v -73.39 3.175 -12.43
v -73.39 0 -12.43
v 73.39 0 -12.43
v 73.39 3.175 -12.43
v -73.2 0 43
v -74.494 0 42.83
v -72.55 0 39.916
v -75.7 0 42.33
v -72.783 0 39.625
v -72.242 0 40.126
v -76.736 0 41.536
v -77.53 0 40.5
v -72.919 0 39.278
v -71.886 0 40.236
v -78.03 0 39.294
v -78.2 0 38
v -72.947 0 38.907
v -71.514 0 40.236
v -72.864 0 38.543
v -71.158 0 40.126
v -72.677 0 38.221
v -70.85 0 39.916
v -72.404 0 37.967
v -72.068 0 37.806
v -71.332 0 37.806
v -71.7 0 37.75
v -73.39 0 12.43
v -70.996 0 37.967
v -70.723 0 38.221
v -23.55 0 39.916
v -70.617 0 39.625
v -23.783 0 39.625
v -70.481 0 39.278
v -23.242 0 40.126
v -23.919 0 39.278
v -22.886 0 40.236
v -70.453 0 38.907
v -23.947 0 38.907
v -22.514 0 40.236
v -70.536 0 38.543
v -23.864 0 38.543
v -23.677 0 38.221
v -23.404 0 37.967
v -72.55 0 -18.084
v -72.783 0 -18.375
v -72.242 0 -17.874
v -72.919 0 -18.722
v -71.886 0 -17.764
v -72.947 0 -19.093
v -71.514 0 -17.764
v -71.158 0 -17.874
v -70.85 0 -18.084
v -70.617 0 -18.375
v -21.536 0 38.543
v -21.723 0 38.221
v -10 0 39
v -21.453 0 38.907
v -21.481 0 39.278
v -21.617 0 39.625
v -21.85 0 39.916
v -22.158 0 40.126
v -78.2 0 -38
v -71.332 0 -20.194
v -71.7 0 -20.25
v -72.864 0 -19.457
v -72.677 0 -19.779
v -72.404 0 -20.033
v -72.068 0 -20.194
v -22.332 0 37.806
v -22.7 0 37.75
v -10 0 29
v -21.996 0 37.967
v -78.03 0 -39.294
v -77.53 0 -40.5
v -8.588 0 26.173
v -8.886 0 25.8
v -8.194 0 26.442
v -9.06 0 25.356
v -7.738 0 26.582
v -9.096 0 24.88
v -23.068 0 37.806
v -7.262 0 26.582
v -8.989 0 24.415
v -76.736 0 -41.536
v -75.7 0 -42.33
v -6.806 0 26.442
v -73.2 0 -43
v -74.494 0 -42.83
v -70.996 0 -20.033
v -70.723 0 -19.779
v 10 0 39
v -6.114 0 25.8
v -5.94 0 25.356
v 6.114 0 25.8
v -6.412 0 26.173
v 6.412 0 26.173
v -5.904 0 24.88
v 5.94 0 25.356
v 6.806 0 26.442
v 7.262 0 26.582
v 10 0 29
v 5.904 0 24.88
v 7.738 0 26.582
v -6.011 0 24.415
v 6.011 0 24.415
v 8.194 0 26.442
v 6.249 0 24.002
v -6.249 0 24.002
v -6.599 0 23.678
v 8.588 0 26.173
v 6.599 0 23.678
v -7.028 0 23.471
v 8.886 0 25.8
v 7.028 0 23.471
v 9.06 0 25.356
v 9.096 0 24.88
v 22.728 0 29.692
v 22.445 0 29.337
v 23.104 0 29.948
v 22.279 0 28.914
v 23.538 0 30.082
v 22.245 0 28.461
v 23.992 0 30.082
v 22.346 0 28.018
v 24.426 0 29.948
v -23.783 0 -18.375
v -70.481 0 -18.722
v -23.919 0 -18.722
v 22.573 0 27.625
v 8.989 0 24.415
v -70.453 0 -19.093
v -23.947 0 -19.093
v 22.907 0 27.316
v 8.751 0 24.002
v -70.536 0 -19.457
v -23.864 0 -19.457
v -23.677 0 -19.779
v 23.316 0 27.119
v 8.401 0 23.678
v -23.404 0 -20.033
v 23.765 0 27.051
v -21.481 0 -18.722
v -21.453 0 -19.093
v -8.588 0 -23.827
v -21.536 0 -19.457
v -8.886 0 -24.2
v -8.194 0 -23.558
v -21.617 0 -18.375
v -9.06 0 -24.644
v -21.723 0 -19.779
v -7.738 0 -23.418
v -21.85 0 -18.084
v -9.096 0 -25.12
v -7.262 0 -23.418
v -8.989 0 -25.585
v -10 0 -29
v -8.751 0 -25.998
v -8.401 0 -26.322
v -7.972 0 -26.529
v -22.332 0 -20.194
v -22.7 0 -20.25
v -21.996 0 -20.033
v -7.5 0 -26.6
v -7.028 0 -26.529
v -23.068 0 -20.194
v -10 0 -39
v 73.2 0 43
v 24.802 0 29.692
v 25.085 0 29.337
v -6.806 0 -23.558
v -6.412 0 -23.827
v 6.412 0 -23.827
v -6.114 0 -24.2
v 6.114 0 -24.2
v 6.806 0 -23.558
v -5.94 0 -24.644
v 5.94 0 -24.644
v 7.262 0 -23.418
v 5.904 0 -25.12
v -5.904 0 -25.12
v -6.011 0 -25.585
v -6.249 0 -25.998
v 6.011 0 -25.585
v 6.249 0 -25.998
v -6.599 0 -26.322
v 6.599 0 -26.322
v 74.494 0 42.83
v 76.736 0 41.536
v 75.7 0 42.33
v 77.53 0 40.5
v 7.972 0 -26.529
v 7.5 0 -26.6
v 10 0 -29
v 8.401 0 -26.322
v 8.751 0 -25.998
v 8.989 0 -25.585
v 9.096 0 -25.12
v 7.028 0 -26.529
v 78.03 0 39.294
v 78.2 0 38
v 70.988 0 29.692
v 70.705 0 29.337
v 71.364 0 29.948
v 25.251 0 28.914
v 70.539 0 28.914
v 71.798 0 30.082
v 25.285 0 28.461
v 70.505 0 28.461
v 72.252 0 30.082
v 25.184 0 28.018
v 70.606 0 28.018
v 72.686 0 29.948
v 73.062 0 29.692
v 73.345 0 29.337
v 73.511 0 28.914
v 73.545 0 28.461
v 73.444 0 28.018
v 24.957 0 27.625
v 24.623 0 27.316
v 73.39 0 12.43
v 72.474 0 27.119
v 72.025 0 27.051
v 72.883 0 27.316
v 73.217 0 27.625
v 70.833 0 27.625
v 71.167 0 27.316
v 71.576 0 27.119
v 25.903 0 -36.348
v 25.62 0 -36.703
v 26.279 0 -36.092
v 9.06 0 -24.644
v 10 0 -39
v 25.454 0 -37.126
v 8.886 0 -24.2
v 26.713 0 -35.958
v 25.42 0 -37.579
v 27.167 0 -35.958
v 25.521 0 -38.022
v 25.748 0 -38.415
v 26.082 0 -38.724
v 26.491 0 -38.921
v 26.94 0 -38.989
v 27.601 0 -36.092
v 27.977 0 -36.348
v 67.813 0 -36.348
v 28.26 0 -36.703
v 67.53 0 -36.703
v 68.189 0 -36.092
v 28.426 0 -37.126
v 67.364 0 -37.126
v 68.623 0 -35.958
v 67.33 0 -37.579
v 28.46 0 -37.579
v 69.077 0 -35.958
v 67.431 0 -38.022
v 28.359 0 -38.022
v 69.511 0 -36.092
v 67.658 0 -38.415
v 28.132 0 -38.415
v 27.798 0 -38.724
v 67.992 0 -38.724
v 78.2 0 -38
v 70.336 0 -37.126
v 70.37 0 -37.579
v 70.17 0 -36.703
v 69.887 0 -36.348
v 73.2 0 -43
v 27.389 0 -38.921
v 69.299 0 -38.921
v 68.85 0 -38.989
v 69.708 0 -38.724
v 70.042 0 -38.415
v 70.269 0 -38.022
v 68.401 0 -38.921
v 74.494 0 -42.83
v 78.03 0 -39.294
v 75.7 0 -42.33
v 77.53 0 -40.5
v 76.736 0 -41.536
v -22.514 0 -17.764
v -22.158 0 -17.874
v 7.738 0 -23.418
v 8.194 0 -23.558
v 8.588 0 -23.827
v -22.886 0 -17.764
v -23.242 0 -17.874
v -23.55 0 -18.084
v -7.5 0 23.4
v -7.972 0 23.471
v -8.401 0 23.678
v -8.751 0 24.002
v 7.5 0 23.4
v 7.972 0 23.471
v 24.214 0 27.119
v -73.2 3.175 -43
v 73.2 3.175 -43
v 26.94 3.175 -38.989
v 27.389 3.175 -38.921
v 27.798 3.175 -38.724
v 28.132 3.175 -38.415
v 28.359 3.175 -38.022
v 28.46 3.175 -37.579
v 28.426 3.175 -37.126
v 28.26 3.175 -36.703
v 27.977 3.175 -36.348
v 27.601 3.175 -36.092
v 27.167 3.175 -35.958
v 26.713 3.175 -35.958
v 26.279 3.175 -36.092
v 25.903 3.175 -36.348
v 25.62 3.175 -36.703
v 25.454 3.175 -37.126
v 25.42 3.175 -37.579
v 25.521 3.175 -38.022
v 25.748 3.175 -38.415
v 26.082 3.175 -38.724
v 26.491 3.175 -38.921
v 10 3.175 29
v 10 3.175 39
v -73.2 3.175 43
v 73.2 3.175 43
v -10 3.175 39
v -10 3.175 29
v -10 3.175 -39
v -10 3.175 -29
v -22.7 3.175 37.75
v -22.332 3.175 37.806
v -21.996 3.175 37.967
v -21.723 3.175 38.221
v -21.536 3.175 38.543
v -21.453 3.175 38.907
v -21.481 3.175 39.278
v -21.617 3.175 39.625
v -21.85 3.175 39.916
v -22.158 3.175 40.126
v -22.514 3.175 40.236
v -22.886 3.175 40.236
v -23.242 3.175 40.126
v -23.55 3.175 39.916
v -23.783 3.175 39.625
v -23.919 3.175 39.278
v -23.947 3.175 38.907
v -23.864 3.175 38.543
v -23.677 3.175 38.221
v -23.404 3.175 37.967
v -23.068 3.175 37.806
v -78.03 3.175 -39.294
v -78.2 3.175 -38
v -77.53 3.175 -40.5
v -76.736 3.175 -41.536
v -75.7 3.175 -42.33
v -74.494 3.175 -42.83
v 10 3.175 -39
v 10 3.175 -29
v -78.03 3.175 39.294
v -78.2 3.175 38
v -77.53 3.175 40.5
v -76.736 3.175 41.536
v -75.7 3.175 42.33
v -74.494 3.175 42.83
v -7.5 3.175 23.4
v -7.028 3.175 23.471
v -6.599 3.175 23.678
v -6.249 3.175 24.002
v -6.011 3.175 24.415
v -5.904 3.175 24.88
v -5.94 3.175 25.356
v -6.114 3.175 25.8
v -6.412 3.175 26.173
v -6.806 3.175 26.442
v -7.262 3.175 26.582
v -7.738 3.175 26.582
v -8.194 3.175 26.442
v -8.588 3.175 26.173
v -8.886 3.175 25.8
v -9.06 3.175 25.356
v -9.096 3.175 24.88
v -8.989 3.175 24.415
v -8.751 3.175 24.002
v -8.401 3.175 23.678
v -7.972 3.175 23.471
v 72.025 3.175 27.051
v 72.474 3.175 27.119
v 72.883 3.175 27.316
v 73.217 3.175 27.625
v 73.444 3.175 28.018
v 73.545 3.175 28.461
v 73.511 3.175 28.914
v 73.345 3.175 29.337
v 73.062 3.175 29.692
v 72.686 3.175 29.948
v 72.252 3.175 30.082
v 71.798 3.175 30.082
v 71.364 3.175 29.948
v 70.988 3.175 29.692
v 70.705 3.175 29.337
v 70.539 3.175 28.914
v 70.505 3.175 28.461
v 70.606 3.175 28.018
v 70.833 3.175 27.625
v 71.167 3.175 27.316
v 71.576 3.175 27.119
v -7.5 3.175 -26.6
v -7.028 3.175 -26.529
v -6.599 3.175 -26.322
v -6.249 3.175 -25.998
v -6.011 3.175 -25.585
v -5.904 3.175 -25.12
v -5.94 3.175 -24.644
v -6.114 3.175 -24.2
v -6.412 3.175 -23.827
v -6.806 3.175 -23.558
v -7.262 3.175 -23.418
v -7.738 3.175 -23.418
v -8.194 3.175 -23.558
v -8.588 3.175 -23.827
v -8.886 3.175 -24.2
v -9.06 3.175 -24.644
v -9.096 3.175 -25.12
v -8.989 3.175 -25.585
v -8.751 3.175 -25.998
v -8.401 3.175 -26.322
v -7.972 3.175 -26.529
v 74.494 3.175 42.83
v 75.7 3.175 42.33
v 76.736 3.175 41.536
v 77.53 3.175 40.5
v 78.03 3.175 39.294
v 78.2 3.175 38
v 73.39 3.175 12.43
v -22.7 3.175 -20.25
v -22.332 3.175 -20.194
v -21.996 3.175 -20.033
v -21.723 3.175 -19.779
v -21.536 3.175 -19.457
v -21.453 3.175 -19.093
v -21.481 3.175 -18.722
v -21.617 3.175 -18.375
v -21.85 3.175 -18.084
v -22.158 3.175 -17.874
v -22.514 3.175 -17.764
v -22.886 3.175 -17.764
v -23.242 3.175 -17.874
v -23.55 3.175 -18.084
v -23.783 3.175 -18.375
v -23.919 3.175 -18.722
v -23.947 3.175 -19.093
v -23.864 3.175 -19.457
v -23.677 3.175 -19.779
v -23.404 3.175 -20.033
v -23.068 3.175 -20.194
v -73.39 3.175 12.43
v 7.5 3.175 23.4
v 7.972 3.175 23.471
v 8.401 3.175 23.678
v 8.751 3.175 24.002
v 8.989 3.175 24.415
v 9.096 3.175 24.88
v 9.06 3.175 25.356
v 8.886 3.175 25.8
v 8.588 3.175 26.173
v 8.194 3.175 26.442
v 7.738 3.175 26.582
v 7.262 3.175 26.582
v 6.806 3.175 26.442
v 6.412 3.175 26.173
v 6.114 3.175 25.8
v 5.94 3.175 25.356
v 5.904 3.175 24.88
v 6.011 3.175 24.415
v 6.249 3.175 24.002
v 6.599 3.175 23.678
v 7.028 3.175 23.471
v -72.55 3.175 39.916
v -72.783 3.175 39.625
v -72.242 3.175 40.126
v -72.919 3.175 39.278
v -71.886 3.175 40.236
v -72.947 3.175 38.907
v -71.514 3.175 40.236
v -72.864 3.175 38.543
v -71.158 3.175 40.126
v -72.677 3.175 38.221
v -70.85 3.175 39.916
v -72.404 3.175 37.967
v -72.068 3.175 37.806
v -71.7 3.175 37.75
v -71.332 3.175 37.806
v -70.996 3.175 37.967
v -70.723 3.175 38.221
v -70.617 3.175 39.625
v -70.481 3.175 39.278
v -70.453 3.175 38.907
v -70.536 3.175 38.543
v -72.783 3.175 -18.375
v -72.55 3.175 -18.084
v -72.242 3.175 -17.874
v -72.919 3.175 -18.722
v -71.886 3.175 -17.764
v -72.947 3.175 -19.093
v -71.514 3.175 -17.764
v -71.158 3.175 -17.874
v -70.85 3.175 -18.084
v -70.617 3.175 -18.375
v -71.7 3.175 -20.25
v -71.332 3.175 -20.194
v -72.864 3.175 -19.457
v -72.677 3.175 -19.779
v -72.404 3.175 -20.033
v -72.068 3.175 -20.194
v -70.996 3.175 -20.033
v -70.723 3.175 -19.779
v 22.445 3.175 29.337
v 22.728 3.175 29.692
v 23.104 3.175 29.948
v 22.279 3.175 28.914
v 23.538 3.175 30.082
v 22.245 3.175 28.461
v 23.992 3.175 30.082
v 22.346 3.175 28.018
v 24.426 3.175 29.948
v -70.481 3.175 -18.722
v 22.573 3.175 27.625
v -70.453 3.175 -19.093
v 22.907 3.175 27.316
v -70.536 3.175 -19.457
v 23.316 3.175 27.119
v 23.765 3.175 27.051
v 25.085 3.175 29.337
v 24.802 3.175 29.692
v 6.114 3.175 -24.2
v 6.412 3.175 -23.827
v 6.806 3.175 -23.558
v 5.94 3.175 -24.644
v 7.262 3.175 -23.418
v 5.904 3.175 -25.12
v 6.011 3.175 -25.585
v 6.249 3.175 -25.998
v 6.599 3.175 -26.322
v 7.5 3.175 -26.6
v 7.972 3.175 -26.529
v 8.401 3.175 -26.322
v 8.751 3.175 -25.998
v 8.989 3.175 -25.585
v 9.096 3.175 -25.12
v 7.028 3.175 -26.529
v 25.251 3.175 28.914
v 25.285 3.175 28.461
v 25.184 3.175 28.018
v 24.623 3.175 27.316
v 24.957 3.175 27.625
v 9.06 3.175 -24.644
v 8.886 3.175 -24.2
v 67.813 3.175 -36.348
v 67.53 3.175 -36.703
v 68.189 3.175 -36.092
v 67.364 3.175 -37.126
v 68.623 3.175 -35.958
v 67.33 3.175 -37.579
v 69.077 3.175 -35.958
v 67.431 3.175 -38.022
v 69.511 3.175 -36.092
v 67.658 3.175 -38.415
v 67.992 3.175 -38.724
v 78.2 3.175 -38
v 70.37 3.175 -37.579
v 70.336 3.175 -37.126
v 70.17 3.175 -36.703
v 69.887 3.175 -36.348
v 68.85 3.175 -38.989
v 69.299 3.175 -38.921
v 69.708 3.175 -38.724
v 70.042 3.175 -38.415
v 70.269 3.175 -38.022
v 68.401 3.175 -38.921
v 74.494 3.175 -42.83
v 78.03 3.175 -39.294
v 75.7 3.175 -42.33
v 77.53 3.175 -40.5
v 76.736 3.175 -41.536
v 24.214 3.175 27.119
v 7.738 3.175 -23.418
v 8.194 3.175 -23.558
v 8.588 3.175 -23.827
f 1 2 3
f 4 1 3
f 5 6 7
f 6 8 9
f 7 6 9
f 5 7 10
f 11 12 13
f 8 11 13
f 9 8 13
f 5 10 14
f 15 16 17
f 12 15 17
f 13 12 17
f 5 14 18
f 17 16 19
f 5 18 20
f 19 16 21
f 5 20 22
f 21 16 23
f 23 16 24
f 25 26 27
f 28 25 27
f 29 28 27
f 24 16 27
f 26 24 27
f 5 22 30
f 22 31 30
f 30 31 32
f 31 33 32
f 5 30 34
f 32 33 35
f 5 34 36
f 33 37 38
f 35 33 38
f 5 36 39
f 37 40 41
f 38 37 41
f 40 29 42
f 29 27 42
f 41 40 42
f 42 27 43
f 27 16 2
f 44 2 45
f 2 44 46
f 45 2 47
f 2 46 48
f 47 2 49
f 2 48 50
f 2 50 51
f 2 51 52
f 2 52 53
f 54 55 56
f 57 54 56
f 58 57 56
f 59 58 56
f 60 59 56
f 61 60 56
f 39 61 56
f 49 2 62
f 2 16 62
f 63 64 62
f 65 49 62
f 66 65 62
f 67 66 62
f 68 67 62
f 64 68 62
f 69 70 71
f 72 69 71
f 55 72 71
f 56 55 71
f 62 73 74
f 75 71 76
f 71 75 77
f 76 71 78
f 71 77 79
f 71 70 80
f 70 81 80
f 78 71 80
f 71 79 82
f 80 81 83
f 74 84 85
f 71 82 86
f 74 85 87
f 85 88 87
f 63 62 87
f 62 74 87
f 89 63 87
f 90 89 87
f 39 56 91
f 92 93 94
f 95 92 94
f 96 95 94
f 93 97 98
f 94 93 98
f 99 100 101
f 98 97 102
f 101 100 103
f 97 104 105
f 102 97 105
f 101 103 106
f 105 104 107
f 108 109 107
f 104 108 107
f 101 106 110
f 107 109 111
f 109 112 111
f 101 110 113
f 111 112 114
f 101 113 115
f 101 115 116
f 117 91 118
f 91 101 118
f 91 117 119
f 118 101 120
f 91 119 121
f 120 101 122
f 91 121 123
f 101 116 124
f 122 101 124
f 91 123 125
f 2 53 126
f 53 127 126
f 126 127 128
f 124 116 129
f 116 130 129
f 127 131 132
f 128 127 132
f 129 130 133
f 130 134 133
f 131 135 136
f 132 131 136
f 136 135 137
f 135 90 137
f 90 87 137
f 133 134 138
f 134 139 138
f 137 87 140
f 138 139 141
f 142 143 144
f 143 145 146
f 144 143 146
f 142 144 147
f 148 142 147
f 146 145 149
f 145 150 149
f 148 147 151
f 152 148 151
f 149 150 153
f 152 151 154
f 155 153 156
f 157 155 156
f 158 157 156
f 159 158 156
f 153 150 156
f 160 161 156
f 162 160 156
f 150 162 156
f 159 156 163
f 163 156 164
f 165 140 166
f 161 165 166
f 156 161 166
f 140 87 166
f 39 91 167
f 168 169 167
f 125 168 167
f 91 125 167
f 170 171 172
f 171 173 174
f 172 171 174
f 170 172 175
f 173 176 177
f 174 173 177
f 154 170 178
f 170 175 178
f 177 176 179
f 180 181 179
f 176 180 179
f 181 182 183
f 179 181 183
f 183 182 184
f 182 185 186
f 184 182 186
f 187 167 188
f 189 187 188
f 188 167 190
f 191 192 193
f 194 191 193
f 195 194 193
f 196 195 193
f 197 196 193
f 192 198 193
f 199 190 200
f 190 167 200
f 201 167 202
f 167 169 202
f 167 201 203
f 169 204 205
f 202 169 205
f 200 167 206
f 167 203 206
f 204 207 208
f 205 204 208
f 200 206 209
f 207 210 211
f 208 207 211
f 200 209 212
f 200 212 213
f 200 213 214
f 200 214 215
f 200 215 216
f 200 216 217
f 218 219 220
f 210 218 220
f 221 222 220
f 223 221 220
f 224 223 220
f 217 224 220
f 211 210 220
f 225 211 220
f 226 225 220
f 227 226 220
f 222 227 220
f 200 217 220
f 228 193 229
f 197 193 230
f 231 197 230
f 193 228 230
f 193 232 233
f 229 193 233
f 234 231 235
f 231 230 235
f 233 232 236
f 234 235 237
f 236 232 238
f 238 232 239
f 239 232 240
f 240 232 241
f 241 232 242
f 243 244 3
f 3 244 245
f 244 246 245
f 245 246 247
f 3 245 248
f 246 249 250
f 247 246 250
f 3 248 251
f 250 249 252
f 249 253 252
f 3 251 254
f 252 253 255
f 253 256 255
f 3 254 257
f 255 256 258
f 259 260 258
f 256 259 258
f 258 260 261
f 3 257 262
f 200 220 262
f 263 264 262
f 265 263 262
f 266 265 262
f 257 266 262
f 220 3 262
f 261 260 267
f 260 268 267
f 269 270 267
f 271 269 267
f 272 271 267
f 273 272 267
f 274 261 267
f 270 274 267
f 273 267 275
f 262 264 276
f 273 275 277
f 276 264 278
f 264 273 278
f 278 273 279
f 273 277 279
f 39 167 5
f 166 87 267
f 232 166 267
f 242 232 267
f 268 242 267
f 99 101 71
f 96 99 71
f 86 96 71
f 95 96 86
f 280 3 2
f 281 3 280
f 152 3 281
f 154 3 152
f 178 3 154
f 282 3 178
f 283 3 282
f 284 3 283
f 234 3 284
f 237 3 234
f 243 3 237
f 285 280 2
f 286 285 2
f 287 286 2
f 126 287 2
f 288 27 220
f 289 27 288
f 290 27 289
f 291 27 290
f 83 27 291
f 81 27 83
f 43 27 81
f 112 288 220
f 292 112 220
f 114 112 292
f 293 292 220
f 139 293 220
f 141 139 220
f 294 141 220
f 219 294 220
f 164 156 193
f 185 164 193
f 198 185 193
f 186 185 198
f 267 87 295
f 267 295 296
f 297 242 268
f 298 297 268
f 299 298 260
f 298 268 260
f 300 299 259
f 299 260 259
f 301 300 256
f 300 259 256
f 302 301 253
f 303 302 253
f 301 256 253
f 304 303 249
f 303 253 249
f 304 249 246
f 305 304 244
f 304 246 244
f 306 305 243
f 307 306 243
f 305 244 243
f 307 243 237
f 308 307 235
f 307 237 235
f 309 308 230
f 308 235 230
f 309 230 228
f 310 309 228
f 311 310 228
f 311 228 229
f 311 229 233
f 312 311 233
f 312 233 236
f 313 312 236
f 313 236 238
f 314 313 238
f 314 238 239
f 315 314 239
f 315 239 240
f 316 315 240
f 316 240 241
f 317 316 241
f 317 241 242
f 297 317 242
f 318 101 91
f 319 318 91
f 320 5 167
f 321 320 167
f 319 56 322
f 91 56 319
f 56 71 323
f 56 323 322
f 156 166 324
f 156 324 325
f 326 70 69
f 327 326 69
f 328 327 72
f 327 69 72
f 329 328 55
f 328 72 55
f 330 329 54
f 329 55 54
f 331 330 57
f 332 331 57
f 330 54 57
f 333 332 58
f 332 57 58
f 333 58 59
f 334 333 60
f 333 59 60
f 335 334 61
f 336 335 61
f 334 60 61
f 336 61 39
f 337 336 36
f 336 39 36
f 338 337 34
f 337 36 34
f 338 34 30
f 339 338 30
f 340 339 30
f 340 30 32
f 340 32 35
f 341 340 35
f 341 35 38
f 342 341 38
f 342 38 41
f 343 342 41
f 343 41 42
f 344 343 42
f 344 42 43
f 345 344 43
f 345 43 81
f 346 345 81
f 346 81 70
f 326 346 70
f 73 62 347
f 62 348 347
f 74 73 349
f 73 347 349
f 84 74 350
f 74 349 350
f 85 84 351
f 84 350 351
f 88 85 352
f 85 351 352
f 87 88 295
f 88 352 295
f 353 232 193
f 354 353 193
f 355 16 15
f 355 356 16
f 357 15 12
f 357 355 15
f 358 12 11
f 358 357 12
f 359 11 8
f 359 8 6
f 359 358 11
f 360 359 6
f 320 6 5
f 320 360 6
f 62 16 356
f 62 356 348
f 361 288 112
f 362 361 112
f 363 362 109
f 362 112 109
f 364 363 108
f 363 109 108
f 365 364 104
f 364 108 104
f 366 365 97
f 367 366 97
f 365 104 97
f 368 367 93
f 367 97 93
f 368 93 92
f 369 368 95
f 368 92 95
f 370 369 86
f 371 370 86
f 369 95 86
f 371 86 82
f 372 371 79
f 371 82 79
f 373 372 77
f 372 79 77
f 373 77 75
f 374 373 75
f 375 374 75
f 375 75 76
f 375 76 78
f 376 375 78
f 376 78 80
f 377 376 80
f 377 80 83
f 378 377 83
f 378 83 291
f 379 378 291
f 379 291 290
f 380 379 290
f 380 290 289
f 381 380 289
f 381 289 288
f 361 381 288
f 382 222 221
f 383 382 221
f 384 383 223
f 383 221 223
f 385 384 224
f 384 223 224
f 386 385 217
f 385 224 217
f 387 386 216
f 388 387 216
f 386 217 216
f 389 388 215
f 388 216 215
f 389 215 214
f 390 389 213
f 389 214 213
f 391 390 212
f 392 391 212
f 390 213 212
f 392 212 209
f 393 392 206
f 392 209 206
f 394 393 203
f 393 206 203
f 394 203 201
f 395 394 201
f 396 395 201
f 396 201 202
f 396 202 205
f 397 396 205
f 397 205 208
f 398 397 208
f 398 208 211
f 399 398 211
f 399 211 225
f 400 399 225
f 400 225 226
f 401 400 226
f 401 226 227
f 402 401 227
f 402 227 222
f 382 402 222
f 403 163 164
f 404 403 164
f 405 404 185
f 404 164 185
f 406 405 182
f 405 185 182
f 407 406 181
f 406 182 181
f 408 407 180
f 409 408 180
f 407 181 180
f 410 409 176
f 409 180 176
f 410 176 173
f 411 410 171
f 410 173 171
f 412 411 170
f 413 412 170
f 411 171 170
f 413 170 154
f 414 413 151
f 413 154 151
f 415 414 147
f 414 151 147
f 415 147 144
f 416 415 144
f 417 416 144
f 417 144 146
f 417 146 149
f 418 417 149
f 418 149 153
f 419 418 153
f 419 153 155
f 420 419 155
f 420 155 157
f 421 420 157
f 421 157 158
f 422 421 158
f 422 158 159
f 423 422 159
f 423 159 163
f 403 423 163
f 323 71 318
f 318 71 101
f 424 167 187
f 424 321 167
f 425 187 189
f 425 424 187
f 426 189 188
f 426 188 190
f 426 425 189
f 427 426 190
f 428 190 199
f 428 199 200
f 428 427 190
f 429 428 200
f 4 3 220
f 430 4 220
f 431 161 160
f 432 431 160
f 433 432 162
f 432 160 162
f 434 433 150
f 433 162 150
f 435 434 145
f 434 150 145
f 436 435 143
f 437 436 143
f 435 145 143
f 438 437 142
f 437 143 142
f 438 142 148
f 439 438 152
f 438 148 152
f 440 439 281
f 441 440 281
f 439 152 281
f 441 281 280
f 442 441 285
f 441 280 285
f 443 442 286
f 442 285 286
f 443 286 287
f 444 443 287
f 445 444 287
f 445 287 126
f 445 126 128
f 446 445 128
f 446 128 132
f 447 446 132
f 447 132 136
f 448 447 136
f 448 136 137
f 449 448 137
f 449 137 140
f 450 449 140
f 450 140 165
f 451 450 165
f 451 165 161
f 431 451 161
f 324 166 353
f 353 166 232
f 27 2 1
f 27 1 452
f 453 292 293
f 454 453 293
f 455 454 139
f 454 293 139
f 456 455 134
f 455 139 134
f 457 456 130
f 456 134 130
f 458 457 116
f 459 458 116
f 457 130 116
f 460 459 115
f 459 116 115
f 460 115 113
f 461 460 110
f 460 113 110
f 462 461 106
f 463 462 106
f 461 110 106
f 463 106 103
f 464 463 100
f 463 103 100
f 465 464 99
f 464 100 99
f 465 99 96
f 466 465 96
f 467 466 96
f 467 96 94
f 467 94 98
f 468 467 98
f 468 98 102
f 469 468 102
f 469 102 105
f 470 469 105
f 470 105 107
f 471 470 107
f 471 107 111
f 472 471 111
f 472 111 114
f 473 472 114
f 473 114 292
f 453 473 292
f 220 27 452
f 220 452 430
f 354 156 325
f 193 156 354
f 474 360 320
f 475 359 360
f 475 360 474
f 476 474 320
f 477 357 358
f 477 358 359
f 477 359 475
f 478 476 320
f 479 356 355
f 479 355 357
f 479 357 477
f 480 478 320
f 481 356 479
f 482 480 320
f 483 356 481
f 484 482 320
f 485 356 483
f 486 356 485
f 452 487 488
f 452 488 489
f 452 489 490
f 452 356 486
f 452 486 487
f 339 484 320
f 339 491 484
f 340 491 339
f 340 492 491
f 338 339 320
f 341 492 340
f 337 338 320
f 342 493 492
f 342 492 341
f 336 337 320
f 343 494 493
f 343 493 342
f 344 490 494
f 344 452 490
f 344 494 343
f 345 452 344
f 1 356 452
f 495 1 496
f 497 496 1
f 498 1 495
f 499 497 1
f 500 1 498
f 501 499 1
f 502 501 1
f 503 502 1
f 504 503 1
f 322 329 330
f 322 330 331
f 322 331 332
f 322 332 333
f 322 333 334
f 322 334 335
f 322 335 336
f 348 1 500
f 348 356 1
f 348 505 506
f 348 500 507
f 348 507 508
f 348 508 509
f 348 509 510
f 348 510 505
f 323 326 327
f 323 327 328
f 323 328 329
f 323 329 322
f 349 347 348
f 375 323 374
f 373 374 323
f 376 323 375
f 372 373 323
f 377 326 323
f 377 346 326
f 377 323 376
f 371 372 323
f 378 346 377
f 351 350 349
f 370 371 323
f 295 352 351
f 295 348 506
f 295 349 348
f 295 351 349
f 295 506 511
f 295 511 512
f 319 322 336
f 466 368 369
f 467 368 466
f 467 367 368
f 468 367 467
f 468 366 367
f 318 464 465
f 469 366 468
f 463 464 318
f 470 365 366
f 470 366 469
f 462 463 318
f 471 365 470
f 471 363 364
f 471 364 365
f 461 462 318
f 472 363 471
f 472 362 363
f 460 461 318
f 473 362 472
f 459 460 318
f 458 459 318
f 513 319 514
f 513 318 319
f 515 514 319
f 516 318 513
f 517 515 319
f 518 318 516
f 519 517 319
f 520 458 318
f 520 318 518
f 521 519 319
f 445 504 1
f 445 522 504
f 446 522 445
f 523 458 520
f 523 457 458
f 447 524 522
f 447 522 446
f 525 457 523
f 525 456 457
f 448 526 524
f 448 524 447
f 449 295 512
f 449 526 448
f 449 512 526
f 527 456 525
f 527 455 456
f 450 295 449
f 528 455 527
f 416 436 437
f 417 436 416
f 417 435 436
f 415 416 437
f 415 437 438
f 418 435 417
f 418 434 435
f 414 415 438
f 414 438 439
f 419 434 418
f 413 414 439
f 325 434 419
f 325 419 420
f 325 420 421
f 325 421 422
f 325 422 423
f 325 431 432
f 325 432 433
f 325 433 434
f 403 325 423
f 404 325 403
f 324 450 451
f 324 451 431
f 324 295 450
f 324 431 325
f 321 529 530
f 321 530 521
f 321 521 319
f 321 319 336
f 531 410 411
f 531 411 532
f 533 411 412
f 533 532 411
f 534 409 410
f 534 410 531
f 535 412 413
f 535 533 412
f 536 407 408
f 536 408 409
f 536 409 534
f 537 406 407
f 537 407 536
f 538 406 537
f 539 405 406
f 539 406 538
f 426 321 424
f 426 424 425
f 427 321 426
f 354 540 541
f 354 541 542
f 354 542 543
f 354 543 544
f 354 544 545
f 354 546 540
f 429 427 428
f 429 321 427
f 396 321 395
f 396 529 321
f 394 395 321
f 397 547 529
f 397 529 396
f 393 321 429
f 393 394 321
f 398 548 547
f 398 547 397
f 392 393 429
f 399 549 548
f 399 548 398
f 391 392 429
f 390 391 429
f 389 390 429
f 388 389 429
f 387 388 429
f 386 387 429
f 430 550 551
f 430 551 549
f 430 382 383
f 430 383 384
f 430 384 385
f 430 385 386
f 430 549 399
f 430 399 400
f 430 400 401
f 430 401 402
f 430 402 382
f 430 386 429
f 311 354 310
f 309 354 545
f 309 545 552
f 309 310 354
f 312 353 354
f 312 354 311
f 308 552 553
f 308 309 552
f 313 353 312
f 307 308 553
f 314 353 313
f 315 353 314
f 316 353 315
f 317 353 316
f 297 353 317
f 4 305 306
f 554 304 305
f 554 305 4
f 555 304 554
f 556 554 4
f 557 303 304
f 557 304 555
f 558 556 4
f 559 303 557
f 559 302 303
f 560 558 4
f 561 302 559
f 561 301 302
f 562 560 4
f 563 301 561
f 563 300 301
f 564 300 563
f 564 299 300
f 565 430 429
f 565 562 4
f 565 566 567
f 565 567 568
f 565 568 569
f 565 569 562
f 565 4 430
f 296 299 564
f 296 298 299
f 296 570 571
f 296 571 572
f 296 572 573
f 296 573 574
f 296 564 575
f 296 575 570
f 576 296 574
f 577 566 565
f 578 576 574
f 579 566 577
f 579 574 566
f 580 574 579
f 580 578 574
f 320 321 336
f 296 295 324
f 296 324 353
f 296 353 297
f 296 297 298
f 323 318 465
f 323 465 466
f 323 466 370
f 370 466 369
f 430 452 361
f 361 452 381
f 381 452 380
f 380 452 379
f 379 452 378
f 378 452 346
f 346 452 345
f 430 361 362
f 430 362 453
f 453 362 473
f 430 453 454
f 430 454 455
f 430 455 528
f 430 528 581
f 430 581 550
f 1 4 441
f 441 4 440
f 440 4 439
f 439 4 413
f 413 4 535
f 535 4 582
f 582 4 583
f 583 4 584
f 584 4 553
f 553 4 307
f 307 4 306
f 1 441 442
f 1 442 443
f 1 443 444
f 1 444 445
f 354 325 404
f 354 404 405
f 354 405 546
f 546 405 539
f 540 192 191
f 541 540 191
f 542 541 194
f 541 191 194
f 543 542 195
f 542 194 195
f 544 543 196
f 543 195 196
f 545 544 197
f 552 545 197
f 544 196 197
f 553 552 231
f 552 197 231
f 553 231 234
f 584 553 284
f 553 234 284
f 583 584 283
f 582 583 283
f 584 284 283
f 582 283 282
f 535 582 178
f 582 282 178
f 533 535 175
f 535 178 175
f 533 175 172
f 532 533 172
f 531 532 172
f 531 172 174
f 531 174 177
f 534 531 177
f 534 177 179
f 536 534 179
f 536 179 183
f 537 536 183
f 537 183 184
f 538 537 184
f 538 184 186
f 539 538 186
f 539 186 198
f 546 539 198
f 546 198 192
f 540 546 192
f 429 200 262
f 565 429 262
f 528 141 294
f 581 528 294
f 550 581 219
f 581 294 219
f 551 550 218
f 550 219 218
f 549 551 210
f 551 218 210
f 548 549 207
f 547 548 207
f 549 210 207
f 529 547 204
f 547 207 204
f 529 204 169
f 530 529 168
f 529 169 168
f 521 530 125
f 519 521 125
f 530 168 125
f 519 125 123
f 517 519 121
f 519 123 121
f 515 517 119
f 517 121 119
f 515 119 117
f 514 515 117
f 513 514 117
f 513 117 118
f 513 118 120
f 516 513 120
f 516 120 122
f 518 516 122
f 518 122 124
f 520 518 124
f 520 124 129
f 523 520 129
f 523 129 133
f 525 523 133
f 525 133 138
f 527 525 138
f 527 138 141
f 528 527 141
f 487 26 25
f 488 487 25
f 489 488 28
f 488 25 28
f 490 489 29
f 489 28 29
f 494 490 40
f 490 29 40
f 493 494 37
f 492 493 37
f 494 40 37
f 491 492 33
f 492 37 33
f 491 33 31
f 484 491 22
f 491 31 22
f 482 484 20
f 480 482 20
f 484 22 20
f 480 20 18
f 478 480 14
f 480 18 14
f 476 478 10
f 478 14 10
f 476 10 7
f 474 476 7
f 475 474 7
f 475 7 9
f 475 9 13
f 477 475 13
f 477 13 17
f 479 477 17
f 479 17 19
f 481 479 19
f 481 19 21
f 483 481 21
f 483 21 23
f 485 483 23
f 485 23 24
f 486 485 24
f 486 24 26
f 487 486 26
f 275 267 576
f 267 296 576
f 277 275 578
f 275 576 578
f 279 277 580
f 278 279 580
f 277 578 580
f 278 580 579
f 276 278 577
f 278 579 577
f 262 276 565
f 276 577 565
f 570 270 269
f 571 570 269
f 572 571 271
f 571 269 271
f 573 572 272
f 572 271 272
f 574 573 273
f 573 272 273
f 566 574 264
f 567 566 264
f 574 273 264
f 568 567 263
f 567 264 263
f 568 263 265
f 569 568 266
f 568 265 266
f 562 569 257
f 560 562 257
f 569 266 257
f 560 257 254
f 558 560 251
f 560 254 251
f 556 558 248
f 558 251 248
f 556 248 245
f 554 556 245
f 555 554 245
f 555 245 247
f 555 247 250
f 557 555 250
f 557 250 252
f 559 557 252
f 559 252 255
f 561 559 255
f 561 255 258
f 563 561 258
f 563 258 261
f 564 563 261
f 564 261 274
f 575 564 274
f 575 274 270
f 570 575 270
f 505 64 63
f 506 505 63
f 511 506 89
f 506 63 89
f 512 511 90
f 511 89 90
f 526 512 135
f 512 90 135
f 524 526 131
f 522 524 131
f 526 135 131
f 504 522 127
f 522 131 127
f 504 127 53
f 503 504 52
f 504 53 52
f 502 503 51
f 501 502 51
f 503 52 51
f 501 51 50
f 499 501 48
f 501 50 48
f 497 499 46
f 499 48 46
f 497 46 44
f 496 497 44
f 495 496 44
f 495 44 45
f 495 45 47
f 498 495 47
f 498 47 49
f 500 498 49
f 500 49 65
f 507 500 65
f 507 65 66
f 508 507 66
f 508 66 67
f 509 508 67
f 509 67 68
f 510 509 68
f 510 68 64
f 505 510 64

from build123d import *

# Parameters (mm, degrees)
SKETCH1_W           = 156.4
SKETCH1_H           = 86
BOSS_EXTRUDE1_DEPTH = 3.175
SKETCH3_R           = 1.25
SKETCH3_R_2         = 1.524
CUT_EXTRUDE2_DEPTH  = 90.299051647
SKETCH4_W           = 146.78
SKETCH4_H           = 24.86
CUT_EXTRUDE3_DEPTH  = 90.299051647
SKETCH5_R           = 1.6
CUT_EXTRUDE4_DEPTH  = 90.299051647
SKETCH6_W           = 20
SKETCH6_H           = 10
CUT_EXTRUDE5_DEPTH  = 90.299051647
FILLET1_R           = 5


with BuildPart() as part:
    # Sketch1 → Boss-Extrude1 (new body)
    with BuildSketch(Plane(origin=(0, 0, 0), x_dir=(1, 0, 0), z_dir=(0, 1, 0))):
        Rectangle(SKETCH1_W, SKETCH1_H)
    extrude(amount=BOSS_EXTRUDE1_DEPTH)

    # Sketch3 → Cut-Extrude2 (cut, through all)
    with BuildSketch(Plane.XZ):
        with Locations(Location((-22.7, -19, 0), (0, 0, 270))):
            Circle(SKETCH3_R)
        with Locations(Location((-71.7, -19, 0), (0, 0, 270))):
            Circle(SKETCH3_R)
        with Locations(Location((-71.7, 39, 0), (0, 0, 270))):
            Circle(SKETCH3_R)
        with Locations(Location((-22.7, 39, 0), (0, 0, 270))):
            Circle(SKETCH3_R)
        with Locations(Location((72.025, 28.575, 0), (0, 0, 270))):
            Circle(SKETCH3_R_2)
        with Locations(Location((23.765, 28.575, 0), (0, 0, 270))):
            Circle(SKETCH3_R_2)
        with Locations(Location((68.85, -37.465, 0), (0, 0, 270))):
            Circle(SKETCH3_R_2)
        with Locations(Location((26.94, -37.465, 0), (0, 0, 270))):
            Circle(SKETCH3_R_2)
    extrude(amount=-CUT_EXTRUDE2_DEPTH, mode=Mode.SUBTRACT)

    # Sketch4 → Cut-Extrude3 (cut, through all)
    with BuildSketch(Plane.XZ):
        Rectangle(SKETCH4_W, SKETCH4_H)
    extrude(amount=-CUT_EXTRUDE3_DEPTH, mode=Mode.SUBTRACT)

    # Sketch5 → Cut-Extrude4 (cut, through all)
    with BuildSketch(Plane.XZ):
        with Locations(Location((7.5, -25, 0), (0, 0, 270))):
            Circle(SKETCH5_R)
        with Locations(Location((-7.5, -25, 0), (0, 0, 270))):
            Circle(SKETCH5_R)
        with Locations(Location((-7.5, 25, 0), (0, 0, 270))):
            Circle(SKETCH5_R)
        with Locations(Location((7.5, 25, 0), (0, 0, 270))):
            Circle(SKETCH5_R)
    extrude(amount=-CUT_EXTRUDE4_DEPTH, mode=Mode.SUBTRACT)

    # Sketch6 → Cut-Extrude5 (cut, through all)
    with BuildSketch(Plane.XZ):
        with Locations((0, 34)):
            Rectangle(SKETCH6_W, SKETCH6_H)
        with Locations((0, -34)):
            Rectangle(SKETCH6_W, SKETCH6_H)
    extrude(amount=-CUT_EXTRUDE5_DEPTH, mode=Mode.SUBTRACT)

    # Fillet1
    fillet1_edges = [part.edges().sort_by_distance(p)[0] for p in [
        (78.2, 1.5875, 43),
        (-78.2, 1.5875, 43),
        (-78.2, 1.5875, -43),
        (78.2, 1.5875, -43),
    ]]
    fillet(fillet1_edges, radius=FILLET1_R)


solid = part.part
